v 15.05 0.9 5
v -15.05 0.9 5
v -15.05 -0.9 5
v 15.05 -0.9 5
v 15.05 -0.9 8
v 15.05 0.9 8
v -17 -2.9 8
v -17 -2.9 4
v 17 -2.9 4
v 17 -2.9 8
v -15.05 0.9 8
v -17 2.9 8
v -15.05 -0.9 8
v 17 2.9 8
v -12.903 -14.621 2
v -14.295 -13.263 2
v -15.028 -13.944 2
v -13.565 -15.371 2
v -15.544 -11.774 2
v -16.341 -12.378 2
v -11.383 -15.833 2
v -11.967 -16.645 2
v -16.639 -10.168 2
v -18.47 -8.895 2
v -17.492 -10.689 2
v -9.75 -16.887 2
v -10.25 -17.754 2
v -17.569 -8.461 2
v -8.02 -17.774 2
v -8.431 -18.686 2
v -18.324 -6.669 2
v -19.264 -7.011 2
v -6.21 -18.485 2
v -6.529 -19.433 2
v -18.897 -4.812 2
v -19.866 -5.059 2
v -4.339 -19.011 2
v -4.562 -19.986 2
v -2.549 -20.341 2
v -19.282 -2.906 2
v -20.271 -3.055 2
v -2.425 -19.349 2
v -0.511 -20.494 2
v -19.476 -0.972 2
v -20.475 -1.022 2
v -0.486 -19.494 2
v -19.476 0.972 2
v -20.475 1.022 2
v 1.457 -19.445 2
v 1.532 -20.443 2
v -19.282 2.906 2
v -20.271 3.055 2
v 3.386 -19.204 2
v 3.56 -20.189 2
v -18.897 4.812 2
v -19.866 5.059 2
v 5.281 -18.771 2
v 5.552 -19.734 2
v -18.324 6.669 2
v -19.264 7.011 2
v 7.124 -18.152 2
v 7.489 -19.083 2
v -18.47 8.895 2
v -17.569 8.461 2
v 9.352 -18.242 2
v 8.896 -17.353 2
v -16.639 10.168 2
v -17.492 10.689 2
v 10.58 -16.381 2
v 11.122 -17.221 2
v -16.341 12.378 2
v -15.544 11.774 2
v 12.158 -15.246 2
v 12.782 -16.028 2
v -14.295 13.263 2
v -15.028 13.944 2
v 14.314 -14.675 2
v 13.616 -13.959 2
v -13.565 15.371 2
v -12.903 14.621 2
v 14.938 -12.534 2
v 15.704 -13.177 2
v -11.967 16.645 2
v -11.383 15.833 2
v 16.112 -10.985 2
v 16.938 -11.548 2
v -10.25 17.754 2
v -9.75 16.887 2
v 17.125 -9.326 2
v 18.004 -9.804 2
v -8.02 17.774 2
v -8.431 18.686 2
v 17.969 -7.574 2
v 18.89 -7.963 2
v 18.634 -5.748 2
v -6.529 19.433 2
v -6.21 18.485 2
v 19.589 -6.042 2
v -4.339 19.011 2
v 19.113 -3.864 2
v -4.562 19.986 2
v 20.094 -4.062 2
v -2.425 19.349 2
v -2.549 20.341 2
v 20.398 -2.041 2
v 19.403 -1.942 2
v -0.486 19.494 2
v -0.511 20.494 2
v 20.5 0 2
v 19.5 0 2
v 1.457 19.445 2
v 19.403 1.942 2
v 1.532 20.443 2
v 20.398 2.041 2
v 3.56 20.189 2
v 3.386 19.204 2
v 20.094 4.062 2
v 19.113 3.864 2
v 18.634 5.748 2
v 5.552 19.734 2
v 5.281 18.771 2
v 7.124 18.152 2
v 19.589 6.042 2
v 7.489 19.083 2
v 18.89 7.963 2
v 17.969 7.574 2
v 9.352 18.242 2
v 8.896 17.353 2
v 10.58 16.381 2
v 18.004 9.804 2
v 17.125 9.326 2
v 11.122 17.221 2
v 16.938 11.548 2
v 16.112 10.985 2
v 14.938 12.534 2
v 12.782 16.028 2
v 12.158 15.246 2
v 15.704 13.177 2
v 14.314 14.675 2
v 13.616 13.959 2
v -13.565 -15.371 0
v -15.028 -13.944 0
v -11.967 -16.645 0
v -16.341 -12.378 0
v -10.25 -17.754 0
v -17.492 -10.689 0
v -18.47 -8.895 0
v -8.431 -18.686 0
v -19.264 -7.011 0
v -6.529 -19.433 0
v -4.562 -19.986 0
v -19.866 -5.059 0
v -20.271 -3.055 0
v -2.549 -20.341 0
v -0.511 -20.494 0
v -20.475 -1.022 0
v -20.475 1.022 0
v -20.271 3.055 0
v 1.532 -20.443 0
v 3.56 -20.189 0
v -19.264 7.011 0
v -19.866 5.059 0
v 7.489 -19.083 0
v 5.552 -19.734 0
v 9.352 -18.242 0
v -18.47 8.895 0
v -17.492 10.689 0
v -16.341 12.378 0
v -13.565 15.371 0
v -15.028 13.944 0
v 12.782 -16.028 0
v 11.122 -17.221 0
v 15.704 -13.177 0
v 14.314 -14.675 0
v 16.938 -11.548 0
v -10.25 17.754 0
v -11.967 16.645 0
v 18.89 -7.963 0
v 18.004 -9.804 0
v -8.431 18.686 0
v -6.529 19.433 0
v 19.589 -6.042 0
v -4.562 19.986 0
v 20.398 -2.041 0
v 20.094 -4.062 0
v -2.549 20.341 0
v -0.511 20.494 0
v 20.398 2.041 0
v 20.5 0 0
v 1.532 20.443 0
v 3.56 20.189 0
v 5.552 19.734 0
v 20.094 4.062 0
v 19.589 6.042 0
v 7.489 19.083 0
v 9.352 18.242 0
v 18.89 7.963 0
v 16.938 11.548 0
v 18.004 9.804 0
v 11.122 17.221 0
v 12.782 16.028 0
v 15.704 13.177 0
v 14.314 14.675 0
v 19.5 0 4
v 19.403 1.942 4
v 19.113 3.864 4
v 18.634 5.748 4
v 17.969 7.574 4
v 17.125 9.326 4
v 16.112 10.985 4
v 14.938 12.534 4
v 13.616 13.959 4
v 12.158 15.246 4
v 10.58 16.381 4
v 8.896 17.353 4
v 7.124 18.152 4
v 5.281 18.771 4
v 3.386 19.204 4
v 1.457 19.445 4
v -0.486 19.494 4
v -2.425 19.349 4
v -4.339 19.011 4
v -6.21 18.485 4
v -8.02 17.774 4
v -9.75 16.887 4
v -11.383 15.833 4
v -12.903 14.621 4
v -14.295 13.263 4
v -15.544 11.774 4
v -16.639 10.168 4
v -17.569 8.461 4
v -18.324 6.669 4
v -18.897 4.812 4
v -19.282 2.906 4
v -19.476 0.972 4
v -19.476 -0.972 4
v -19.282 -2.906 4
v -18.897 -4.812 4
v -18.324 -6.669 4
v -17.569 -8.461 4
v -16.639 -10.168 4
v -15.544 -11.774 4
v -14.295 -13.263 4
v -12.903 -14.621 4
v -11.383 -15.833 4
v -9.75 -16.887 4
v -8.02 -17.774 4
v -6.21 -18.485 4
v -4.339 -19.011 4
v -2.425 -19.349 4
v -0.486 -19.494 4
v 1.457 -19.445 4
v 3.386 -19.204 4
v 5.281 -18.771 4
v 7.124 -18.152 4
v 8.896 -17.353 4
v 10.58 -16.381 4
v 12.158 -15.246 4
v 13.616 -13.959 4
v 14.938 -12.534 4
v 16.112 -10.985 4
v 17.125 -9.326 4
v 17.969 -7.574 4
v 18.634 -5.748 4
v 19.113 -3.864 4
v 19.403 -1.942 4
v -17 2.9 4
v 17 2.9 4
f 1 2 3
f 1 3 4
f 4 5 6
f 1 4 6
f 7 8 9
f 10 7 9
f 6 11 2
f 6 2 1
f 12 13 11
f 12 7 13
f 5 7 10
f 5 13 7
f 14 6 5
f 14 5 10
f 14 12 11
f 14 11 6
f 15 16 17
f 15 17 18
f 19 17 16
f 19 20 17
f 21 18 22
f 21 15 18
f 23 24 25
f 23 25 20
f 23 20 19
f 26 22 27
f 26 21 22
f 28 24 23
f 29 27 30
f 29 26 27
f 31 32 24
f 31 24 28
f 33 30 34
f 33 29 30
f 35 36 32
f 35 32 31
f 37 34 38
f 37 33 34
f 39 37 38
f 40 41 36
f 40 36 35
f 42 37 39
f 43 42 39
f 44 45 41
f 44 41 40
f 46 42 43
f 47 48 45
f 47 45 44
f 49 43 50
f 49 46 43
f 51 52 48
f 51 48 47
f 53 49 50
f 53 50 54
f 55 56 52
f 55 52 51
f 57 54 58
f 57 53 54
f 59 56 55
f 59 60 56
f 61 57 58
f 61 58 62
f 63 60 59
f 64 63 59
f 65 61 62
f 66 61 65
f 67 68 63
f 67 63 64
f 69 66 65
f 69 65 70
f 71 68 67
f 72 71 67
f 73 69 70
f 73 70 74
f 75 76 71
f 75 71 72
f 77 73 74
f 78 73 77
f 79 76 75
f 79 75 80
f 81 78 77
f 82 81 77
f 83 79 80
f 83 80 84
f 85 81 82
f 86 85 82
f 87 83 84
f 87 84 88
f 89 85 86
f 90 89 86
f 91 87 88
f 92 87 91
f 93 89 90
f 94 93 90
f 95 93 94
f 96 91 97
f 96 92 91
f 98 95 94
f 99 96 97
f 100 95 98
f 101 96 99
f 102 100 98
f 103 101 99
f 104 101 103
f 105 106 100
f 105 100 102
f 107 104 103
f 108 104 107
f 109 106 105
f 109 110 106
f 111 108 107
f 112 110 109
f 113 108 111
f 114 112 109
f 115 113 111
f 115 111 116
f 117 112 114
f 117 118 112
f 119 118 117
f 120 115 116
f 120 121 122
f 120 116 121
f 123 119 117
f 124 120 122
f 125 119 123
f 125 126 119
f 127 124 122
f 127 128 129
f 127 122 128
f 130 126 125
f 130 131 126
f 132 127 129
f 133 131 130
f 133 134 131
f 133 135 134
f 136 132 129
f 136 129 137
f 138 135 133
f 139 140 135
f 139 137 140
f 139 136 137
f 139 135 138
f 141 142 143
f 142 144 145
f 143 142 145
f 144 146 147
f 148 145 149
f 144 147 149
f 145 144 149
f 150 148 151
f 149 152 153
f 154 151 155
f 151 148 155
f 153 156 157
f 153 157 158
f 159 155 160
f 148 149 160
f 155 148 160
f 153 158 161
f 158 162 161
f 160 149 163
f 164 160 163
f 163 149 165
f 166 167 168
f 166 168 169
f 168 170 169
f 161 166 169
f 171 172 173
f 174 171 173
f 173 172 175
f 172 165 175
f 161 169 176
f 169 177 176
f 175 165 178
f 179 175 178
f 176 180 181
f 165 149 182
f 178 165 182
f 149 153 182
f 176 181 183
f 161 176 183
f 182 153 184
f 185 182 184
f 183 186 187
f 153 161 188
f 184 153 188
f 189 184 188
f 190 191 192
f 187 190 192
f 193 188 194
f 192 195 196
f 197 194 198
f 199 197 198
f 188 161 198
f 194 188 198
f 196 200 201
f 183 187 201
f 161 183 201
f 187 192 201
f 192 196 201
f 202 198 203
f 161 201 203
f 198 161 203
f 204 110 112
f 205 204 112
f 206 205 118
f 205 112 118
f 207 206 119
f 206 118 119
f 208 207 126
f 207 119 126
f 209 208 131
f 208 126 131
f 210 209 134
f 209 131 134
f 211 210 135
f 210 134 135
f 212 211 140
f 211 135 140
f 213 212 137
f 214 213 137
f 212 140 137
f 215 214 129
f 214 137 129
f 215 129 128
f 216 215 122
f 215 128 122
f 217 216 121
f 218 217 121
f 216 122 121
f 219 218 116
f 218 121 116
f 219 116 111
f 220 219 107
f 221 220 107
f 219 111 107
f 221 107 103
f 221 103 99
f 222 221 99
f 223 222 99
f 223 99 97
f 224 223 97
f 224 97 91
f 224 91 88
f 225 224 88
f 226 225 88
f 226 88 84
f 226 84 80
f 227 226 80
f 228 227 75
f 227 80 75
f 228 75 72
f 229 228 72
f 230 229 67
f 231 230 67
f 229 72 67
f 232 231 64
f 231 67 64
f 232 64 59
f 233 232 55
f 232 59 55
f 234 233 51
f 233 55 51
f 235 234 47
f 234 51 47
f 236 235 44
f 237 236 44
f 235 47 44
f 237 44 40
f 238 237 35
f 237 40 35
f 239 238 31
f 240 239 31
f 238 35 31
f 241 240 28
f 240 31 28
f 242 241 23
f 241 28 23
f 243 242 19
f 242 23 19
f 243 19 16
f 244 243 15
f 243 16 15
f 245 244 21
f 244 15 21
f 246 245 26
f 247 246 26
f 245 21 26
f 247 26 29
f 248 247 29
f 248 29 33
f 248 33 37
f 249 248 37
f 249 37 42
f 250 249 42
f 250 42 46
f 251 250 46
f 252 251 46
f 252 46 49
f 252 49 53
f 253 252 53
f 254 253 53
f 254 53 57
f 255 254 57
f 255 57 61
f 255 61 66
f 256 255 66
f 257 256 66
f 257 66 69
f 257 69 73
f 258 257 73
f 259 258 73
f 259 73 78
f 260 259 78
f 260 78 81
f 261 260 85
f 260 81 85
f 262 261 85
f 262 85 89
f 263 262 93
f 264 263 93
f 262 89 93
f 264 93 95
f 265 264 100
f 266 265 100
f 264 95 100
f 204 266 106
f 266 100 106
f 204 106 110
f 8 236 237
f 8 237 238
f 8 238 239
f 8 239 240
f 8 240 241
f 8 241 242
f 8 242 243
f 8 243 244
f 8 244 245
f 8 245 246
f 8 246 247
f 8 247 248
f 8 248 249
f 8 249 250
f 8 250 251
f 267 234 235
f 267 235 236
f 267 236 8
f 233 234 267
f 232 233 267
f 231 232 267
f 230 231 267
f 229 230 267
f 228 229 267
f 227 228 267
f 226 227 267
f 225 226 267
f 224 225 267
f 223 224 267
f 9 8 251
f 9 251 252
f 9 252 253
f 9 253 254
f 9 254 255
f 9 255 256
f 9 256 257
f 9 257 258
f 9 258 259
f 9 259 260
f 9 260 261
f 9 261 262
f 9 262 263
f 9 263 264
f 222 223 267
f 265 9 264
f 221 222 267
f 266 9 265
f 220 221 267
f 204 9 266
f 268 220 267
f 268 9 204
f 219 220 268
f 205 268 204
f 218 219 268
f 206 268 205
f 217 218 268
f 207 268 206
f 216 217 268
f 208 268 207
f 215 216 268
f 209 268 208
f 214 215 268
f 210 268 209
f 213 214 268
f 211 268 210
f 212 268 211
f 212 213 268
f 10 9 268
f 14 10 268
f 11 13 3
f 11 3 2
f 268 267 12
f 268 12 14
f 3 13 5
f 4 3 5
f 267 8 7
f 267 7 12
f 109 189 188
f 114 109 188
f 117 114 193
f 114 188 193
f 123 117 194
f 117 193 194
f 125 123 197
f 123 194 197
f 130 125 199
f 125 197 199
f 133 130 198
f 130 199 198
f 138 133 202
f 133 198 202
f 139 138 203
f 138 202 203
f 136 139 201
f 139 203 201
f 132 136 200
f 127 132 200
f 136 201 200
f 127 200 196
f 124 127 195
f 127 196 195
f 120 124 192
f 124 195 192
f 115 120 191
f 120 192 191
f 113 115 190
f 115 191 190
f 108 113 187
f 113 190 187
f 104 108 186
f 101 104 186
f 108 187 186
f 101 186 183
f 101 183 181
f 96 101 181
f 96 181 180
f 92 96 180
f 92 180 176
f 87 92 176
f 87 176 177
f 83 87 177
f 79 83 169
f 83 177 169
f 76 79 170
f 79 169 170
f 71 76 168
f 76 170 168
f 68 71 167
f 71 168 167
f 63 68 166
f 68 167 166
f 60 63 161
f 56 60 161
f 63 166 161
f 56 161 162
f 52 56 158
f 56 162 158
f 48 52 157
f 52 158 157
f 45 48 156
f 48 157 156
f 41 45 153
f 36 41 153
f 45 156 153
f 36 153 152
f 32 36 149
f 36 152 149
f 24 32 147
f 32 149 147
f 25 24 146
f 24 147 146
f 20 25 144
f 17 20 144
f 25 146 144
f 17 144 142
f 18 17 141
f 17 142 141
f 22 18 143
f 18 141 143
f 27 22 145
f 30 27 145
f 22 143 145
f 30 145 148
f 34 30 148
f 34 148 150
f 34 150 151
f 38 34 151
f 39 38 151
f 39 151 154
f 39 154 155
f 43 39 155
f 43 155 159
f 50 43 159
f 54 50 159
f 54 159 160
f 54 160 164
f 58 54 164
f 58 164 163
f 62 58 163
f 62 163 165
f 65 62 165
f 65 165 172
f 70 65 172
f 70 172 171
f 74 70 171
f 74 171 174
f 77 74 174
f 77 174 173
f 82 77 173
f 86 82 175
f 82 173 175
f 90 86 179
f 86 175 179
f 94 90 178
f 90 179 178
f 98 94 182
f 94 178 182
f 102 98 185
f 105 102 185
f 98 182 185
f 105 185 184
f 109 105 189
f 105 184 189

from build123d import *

# Parameters (mm, degrees)
SKETCH_R     = 20.5
PAD_DEPTH    = 2
SKETCH001_R  = 19.5
PAD001_DEPTH = 2
SKETCH002_W  = 34
SKETCH002_H  = 5.8
PAD002_DEPTH = 4
SKETCH003_W  = 30.1
SKETCH003_H  = 1.8
POCKET_DEPTH = 3


with BuildPart() as part:
    # Sketch → Pad (new body)
    with BuildSketch(Plane.XY):
        Circle(SKETCH_R)
    extrude(amount=PAD_DEPTH)

    # Sketch001 (on Face3 of Pad) → Pad001 (join)
    with BuildSketch(Plane.XY.offset(2)):
        Circle(SKETCH001_R)
    extrude(amount=PAD001_DEPTH)

    # Sketch002 (on Face5 of Pad001) → Pad002 (join)
    with BuildSketch(Plane.XY.offset(4)):
        Rectangle(SKETCH002_W, SKETCH002_H)
    extrude(amount=PAD002_DEPTH)

    # Sketch003 (on Face10 of Pad002) → Pocket (cut)
    with BuildSketch(Plane.XY.offset(8)):
        Rectangle(SKETCH003_W, SKETCH003_H)
    extrude(amount=-POCKET_DEPTH, mode=Mode.SUBTRACT)


solid = part.part
